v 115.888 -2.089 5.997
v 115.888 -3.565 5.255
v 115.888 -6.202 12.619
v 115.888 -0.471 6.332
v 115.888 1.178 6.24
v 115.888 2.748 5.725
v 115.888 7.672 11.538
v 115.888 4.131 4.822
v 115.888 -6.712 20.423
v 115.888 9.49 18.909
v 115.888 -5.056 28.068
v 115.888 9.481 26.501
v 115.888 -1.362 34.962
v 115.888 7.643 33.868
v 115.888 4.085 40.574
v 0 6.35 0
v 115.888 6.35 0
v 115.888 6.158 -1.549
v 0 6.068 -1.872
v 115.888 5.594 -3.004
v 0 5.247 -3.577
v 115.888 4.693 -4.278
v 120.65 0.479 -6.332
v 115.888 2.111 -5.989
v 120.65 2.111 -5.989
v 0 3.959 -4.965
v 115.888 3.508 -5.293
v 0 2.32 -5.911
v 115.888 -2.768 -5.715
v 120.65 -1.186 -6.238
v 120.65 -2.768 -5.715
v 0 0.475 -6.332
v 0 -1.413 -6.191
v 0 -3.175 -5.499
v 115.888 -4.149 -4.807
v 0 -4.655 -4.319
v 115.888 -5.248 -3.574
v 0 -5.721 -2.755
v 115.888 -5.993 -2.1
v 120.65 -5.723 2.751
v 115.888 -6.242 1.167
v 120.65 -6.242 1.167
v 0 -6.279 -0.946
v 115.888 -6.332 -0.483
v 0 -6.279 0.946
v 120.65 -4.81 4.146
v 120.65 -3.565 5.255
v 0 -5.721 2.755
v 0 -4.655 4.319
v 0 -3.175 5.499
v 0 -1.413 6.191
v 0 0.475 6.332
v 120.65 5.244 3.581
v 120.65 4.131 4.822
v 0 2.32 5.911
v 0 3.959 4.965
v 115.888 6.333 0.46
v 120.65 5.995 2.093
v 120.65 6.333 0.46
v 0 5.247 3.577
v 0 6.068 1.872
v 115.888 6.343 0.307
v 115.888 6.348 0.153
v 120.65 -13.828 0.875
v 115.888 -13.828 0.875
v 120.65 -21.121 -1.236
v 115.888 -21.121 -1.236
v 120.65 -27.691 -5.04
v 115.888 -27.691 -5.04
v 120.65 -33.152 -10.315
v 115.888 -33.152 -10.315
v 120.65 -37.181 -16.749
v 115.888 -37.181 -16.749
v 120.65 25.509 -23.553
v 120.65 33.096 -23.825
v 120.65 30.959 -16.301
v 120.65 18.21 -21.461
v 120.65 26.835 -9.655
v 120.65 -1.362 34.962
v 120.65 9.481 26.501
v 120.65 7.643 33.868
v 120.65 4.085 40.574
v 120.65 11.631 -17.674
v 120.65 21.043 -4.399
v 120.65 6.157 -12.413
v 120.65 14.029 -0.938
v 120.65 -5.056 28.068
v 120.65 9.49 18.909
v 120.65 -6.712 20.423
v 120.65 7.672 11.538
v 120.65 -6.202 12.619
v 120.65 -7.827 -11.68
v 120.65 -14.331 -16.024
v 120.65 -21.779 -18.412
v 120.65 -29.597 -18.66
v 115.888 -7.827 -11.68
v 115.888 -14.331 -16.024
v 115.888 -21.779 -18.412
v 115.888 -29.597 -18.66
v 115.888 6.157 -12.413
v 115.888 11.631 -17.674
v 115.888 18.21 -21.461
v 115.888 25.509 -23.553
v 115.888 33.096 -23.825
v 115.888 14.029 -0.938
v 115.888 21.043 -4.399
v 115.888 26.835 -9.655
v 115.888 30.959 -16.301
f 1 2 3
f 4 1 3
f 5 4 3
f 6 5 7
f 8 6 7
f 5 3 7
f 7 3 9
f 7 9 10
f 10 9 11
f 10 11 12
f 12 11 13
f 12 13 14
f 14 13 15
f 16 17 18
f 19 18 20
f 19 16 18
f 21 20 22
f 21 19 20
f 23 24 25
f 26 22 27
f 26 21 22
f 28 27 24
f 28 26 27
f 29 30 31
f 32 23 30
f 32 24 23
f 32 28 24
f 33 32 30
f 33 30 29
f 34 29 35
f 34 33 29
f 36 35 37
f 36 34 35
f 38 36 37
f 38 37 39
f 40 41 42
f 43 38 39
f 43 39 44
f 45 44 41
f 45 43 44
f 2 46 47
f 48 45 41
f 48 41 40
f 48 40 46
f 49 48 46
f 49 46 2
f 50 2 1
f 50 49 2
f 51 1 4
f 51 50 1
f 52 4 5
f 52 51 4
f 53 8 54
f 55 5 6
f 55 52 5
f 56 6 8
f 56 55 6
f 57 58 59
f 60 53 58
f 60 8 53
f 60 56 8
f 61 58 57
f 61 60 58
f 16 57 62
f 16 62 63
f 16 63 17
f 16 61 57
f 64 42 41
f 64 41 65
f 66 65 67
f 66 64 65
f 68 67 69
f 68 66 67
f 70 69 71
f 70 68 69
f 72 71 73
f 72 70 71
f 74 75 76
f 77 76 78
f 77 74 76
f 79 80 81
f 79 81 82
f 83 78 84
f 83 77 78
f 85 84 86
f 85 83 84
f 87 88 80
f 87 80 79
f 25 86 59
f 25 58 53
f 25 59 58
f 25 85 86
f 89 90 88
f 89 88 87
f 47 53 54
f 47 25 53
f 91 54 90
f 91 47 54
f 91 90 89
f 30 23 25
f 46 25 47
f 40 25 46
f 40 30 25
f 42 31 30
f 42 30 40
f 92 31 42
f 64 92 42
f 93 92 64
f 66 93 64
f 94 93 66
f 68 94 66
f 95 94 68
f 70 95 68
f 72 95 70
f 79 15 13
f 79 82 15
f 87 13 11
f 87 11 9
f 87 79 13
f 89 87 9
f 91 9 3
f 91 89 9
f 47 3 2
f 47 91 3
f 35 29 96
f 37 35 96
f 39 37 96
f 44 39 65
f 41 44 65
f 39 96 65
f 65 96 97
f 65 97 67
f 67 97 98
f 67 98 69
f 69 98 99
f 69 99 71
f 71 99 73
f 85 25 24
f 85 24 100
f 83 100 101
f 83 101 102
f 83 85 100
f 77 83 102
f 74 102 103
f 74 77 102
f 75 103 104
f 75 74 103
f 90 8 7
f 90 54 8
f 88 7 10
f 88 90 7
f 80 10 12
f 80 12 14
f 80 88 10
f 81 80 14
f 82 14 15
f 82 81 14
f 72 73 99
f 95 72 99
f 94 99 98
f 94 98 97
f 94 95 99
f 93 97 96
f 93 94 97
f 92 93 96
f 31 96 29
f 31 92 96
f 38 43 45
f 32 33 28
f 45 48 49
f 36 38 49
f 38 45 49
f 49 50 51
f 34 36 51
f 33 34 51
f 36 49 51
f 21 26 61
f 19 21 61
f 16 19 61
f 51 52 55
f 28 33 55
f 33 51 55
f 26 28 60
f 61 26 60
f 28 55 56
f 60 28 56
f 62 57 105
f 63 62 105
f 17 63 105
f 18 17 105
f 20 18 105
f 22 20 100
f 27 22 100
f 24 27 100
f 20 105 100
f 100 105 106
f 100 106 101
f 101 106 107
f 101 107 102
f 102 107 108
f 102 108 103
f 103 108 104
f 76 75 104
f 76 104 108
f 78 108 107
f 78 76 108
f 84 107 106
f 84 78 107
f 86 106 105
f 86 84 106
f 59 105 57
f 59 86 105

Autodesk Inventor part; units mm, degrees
ref_plane "YZ Plane" through (0, 0, 0) normal (1, 0, 0) x (0, 1, 0)
ref_plane "XZ Plane" through (0, 0, 0) normal (0, 1, 0) x (-1, 0, 0)
ref_plane "XY Plane" through (0, 0, 0) normal (0, 0, 1) x (1, 0, 0)
sketch "Sketch1" plane through (0, 0, 0) normal (1, 0, 0) x (0, 1, 0)
  circle A0 centre (0, 0) radius 6.35
  dimension "d0" = 12.7
extrude "Extrusion1" add sketch "Sketch1" along normal blind 127
sketch "Sketch2" plane through (127, 0, 0) normal (1, 0, 0) x (0, 0, -1)
  circle A0 centre (0, 0) radius 46.74
extrude "Extrusion2" cut sketch "Sketch2" against normal blind 6.35
sketch "Sketch3" plane through (120.65, 0, 0) normal (1, 0, 0) x (0, 0, -1)
  arc A0 (0, 0) -> (23.8252, 33.0958) centre (-7.3529, 30.4168) ccw
  arc A1 (23.8252, 33.0958) -> (0, 0) centre (27.6846, 5.1939) ccw
extrude "Extrusion3" add sketch "Sketch3" against normal blind 4.7625
pattern_circular "Circular Pattern1" count 3 over 360 about axis through (0, 0, 0) along (1, 0, 0) of "Extrusion3"
properties part number "Motor Axle"
